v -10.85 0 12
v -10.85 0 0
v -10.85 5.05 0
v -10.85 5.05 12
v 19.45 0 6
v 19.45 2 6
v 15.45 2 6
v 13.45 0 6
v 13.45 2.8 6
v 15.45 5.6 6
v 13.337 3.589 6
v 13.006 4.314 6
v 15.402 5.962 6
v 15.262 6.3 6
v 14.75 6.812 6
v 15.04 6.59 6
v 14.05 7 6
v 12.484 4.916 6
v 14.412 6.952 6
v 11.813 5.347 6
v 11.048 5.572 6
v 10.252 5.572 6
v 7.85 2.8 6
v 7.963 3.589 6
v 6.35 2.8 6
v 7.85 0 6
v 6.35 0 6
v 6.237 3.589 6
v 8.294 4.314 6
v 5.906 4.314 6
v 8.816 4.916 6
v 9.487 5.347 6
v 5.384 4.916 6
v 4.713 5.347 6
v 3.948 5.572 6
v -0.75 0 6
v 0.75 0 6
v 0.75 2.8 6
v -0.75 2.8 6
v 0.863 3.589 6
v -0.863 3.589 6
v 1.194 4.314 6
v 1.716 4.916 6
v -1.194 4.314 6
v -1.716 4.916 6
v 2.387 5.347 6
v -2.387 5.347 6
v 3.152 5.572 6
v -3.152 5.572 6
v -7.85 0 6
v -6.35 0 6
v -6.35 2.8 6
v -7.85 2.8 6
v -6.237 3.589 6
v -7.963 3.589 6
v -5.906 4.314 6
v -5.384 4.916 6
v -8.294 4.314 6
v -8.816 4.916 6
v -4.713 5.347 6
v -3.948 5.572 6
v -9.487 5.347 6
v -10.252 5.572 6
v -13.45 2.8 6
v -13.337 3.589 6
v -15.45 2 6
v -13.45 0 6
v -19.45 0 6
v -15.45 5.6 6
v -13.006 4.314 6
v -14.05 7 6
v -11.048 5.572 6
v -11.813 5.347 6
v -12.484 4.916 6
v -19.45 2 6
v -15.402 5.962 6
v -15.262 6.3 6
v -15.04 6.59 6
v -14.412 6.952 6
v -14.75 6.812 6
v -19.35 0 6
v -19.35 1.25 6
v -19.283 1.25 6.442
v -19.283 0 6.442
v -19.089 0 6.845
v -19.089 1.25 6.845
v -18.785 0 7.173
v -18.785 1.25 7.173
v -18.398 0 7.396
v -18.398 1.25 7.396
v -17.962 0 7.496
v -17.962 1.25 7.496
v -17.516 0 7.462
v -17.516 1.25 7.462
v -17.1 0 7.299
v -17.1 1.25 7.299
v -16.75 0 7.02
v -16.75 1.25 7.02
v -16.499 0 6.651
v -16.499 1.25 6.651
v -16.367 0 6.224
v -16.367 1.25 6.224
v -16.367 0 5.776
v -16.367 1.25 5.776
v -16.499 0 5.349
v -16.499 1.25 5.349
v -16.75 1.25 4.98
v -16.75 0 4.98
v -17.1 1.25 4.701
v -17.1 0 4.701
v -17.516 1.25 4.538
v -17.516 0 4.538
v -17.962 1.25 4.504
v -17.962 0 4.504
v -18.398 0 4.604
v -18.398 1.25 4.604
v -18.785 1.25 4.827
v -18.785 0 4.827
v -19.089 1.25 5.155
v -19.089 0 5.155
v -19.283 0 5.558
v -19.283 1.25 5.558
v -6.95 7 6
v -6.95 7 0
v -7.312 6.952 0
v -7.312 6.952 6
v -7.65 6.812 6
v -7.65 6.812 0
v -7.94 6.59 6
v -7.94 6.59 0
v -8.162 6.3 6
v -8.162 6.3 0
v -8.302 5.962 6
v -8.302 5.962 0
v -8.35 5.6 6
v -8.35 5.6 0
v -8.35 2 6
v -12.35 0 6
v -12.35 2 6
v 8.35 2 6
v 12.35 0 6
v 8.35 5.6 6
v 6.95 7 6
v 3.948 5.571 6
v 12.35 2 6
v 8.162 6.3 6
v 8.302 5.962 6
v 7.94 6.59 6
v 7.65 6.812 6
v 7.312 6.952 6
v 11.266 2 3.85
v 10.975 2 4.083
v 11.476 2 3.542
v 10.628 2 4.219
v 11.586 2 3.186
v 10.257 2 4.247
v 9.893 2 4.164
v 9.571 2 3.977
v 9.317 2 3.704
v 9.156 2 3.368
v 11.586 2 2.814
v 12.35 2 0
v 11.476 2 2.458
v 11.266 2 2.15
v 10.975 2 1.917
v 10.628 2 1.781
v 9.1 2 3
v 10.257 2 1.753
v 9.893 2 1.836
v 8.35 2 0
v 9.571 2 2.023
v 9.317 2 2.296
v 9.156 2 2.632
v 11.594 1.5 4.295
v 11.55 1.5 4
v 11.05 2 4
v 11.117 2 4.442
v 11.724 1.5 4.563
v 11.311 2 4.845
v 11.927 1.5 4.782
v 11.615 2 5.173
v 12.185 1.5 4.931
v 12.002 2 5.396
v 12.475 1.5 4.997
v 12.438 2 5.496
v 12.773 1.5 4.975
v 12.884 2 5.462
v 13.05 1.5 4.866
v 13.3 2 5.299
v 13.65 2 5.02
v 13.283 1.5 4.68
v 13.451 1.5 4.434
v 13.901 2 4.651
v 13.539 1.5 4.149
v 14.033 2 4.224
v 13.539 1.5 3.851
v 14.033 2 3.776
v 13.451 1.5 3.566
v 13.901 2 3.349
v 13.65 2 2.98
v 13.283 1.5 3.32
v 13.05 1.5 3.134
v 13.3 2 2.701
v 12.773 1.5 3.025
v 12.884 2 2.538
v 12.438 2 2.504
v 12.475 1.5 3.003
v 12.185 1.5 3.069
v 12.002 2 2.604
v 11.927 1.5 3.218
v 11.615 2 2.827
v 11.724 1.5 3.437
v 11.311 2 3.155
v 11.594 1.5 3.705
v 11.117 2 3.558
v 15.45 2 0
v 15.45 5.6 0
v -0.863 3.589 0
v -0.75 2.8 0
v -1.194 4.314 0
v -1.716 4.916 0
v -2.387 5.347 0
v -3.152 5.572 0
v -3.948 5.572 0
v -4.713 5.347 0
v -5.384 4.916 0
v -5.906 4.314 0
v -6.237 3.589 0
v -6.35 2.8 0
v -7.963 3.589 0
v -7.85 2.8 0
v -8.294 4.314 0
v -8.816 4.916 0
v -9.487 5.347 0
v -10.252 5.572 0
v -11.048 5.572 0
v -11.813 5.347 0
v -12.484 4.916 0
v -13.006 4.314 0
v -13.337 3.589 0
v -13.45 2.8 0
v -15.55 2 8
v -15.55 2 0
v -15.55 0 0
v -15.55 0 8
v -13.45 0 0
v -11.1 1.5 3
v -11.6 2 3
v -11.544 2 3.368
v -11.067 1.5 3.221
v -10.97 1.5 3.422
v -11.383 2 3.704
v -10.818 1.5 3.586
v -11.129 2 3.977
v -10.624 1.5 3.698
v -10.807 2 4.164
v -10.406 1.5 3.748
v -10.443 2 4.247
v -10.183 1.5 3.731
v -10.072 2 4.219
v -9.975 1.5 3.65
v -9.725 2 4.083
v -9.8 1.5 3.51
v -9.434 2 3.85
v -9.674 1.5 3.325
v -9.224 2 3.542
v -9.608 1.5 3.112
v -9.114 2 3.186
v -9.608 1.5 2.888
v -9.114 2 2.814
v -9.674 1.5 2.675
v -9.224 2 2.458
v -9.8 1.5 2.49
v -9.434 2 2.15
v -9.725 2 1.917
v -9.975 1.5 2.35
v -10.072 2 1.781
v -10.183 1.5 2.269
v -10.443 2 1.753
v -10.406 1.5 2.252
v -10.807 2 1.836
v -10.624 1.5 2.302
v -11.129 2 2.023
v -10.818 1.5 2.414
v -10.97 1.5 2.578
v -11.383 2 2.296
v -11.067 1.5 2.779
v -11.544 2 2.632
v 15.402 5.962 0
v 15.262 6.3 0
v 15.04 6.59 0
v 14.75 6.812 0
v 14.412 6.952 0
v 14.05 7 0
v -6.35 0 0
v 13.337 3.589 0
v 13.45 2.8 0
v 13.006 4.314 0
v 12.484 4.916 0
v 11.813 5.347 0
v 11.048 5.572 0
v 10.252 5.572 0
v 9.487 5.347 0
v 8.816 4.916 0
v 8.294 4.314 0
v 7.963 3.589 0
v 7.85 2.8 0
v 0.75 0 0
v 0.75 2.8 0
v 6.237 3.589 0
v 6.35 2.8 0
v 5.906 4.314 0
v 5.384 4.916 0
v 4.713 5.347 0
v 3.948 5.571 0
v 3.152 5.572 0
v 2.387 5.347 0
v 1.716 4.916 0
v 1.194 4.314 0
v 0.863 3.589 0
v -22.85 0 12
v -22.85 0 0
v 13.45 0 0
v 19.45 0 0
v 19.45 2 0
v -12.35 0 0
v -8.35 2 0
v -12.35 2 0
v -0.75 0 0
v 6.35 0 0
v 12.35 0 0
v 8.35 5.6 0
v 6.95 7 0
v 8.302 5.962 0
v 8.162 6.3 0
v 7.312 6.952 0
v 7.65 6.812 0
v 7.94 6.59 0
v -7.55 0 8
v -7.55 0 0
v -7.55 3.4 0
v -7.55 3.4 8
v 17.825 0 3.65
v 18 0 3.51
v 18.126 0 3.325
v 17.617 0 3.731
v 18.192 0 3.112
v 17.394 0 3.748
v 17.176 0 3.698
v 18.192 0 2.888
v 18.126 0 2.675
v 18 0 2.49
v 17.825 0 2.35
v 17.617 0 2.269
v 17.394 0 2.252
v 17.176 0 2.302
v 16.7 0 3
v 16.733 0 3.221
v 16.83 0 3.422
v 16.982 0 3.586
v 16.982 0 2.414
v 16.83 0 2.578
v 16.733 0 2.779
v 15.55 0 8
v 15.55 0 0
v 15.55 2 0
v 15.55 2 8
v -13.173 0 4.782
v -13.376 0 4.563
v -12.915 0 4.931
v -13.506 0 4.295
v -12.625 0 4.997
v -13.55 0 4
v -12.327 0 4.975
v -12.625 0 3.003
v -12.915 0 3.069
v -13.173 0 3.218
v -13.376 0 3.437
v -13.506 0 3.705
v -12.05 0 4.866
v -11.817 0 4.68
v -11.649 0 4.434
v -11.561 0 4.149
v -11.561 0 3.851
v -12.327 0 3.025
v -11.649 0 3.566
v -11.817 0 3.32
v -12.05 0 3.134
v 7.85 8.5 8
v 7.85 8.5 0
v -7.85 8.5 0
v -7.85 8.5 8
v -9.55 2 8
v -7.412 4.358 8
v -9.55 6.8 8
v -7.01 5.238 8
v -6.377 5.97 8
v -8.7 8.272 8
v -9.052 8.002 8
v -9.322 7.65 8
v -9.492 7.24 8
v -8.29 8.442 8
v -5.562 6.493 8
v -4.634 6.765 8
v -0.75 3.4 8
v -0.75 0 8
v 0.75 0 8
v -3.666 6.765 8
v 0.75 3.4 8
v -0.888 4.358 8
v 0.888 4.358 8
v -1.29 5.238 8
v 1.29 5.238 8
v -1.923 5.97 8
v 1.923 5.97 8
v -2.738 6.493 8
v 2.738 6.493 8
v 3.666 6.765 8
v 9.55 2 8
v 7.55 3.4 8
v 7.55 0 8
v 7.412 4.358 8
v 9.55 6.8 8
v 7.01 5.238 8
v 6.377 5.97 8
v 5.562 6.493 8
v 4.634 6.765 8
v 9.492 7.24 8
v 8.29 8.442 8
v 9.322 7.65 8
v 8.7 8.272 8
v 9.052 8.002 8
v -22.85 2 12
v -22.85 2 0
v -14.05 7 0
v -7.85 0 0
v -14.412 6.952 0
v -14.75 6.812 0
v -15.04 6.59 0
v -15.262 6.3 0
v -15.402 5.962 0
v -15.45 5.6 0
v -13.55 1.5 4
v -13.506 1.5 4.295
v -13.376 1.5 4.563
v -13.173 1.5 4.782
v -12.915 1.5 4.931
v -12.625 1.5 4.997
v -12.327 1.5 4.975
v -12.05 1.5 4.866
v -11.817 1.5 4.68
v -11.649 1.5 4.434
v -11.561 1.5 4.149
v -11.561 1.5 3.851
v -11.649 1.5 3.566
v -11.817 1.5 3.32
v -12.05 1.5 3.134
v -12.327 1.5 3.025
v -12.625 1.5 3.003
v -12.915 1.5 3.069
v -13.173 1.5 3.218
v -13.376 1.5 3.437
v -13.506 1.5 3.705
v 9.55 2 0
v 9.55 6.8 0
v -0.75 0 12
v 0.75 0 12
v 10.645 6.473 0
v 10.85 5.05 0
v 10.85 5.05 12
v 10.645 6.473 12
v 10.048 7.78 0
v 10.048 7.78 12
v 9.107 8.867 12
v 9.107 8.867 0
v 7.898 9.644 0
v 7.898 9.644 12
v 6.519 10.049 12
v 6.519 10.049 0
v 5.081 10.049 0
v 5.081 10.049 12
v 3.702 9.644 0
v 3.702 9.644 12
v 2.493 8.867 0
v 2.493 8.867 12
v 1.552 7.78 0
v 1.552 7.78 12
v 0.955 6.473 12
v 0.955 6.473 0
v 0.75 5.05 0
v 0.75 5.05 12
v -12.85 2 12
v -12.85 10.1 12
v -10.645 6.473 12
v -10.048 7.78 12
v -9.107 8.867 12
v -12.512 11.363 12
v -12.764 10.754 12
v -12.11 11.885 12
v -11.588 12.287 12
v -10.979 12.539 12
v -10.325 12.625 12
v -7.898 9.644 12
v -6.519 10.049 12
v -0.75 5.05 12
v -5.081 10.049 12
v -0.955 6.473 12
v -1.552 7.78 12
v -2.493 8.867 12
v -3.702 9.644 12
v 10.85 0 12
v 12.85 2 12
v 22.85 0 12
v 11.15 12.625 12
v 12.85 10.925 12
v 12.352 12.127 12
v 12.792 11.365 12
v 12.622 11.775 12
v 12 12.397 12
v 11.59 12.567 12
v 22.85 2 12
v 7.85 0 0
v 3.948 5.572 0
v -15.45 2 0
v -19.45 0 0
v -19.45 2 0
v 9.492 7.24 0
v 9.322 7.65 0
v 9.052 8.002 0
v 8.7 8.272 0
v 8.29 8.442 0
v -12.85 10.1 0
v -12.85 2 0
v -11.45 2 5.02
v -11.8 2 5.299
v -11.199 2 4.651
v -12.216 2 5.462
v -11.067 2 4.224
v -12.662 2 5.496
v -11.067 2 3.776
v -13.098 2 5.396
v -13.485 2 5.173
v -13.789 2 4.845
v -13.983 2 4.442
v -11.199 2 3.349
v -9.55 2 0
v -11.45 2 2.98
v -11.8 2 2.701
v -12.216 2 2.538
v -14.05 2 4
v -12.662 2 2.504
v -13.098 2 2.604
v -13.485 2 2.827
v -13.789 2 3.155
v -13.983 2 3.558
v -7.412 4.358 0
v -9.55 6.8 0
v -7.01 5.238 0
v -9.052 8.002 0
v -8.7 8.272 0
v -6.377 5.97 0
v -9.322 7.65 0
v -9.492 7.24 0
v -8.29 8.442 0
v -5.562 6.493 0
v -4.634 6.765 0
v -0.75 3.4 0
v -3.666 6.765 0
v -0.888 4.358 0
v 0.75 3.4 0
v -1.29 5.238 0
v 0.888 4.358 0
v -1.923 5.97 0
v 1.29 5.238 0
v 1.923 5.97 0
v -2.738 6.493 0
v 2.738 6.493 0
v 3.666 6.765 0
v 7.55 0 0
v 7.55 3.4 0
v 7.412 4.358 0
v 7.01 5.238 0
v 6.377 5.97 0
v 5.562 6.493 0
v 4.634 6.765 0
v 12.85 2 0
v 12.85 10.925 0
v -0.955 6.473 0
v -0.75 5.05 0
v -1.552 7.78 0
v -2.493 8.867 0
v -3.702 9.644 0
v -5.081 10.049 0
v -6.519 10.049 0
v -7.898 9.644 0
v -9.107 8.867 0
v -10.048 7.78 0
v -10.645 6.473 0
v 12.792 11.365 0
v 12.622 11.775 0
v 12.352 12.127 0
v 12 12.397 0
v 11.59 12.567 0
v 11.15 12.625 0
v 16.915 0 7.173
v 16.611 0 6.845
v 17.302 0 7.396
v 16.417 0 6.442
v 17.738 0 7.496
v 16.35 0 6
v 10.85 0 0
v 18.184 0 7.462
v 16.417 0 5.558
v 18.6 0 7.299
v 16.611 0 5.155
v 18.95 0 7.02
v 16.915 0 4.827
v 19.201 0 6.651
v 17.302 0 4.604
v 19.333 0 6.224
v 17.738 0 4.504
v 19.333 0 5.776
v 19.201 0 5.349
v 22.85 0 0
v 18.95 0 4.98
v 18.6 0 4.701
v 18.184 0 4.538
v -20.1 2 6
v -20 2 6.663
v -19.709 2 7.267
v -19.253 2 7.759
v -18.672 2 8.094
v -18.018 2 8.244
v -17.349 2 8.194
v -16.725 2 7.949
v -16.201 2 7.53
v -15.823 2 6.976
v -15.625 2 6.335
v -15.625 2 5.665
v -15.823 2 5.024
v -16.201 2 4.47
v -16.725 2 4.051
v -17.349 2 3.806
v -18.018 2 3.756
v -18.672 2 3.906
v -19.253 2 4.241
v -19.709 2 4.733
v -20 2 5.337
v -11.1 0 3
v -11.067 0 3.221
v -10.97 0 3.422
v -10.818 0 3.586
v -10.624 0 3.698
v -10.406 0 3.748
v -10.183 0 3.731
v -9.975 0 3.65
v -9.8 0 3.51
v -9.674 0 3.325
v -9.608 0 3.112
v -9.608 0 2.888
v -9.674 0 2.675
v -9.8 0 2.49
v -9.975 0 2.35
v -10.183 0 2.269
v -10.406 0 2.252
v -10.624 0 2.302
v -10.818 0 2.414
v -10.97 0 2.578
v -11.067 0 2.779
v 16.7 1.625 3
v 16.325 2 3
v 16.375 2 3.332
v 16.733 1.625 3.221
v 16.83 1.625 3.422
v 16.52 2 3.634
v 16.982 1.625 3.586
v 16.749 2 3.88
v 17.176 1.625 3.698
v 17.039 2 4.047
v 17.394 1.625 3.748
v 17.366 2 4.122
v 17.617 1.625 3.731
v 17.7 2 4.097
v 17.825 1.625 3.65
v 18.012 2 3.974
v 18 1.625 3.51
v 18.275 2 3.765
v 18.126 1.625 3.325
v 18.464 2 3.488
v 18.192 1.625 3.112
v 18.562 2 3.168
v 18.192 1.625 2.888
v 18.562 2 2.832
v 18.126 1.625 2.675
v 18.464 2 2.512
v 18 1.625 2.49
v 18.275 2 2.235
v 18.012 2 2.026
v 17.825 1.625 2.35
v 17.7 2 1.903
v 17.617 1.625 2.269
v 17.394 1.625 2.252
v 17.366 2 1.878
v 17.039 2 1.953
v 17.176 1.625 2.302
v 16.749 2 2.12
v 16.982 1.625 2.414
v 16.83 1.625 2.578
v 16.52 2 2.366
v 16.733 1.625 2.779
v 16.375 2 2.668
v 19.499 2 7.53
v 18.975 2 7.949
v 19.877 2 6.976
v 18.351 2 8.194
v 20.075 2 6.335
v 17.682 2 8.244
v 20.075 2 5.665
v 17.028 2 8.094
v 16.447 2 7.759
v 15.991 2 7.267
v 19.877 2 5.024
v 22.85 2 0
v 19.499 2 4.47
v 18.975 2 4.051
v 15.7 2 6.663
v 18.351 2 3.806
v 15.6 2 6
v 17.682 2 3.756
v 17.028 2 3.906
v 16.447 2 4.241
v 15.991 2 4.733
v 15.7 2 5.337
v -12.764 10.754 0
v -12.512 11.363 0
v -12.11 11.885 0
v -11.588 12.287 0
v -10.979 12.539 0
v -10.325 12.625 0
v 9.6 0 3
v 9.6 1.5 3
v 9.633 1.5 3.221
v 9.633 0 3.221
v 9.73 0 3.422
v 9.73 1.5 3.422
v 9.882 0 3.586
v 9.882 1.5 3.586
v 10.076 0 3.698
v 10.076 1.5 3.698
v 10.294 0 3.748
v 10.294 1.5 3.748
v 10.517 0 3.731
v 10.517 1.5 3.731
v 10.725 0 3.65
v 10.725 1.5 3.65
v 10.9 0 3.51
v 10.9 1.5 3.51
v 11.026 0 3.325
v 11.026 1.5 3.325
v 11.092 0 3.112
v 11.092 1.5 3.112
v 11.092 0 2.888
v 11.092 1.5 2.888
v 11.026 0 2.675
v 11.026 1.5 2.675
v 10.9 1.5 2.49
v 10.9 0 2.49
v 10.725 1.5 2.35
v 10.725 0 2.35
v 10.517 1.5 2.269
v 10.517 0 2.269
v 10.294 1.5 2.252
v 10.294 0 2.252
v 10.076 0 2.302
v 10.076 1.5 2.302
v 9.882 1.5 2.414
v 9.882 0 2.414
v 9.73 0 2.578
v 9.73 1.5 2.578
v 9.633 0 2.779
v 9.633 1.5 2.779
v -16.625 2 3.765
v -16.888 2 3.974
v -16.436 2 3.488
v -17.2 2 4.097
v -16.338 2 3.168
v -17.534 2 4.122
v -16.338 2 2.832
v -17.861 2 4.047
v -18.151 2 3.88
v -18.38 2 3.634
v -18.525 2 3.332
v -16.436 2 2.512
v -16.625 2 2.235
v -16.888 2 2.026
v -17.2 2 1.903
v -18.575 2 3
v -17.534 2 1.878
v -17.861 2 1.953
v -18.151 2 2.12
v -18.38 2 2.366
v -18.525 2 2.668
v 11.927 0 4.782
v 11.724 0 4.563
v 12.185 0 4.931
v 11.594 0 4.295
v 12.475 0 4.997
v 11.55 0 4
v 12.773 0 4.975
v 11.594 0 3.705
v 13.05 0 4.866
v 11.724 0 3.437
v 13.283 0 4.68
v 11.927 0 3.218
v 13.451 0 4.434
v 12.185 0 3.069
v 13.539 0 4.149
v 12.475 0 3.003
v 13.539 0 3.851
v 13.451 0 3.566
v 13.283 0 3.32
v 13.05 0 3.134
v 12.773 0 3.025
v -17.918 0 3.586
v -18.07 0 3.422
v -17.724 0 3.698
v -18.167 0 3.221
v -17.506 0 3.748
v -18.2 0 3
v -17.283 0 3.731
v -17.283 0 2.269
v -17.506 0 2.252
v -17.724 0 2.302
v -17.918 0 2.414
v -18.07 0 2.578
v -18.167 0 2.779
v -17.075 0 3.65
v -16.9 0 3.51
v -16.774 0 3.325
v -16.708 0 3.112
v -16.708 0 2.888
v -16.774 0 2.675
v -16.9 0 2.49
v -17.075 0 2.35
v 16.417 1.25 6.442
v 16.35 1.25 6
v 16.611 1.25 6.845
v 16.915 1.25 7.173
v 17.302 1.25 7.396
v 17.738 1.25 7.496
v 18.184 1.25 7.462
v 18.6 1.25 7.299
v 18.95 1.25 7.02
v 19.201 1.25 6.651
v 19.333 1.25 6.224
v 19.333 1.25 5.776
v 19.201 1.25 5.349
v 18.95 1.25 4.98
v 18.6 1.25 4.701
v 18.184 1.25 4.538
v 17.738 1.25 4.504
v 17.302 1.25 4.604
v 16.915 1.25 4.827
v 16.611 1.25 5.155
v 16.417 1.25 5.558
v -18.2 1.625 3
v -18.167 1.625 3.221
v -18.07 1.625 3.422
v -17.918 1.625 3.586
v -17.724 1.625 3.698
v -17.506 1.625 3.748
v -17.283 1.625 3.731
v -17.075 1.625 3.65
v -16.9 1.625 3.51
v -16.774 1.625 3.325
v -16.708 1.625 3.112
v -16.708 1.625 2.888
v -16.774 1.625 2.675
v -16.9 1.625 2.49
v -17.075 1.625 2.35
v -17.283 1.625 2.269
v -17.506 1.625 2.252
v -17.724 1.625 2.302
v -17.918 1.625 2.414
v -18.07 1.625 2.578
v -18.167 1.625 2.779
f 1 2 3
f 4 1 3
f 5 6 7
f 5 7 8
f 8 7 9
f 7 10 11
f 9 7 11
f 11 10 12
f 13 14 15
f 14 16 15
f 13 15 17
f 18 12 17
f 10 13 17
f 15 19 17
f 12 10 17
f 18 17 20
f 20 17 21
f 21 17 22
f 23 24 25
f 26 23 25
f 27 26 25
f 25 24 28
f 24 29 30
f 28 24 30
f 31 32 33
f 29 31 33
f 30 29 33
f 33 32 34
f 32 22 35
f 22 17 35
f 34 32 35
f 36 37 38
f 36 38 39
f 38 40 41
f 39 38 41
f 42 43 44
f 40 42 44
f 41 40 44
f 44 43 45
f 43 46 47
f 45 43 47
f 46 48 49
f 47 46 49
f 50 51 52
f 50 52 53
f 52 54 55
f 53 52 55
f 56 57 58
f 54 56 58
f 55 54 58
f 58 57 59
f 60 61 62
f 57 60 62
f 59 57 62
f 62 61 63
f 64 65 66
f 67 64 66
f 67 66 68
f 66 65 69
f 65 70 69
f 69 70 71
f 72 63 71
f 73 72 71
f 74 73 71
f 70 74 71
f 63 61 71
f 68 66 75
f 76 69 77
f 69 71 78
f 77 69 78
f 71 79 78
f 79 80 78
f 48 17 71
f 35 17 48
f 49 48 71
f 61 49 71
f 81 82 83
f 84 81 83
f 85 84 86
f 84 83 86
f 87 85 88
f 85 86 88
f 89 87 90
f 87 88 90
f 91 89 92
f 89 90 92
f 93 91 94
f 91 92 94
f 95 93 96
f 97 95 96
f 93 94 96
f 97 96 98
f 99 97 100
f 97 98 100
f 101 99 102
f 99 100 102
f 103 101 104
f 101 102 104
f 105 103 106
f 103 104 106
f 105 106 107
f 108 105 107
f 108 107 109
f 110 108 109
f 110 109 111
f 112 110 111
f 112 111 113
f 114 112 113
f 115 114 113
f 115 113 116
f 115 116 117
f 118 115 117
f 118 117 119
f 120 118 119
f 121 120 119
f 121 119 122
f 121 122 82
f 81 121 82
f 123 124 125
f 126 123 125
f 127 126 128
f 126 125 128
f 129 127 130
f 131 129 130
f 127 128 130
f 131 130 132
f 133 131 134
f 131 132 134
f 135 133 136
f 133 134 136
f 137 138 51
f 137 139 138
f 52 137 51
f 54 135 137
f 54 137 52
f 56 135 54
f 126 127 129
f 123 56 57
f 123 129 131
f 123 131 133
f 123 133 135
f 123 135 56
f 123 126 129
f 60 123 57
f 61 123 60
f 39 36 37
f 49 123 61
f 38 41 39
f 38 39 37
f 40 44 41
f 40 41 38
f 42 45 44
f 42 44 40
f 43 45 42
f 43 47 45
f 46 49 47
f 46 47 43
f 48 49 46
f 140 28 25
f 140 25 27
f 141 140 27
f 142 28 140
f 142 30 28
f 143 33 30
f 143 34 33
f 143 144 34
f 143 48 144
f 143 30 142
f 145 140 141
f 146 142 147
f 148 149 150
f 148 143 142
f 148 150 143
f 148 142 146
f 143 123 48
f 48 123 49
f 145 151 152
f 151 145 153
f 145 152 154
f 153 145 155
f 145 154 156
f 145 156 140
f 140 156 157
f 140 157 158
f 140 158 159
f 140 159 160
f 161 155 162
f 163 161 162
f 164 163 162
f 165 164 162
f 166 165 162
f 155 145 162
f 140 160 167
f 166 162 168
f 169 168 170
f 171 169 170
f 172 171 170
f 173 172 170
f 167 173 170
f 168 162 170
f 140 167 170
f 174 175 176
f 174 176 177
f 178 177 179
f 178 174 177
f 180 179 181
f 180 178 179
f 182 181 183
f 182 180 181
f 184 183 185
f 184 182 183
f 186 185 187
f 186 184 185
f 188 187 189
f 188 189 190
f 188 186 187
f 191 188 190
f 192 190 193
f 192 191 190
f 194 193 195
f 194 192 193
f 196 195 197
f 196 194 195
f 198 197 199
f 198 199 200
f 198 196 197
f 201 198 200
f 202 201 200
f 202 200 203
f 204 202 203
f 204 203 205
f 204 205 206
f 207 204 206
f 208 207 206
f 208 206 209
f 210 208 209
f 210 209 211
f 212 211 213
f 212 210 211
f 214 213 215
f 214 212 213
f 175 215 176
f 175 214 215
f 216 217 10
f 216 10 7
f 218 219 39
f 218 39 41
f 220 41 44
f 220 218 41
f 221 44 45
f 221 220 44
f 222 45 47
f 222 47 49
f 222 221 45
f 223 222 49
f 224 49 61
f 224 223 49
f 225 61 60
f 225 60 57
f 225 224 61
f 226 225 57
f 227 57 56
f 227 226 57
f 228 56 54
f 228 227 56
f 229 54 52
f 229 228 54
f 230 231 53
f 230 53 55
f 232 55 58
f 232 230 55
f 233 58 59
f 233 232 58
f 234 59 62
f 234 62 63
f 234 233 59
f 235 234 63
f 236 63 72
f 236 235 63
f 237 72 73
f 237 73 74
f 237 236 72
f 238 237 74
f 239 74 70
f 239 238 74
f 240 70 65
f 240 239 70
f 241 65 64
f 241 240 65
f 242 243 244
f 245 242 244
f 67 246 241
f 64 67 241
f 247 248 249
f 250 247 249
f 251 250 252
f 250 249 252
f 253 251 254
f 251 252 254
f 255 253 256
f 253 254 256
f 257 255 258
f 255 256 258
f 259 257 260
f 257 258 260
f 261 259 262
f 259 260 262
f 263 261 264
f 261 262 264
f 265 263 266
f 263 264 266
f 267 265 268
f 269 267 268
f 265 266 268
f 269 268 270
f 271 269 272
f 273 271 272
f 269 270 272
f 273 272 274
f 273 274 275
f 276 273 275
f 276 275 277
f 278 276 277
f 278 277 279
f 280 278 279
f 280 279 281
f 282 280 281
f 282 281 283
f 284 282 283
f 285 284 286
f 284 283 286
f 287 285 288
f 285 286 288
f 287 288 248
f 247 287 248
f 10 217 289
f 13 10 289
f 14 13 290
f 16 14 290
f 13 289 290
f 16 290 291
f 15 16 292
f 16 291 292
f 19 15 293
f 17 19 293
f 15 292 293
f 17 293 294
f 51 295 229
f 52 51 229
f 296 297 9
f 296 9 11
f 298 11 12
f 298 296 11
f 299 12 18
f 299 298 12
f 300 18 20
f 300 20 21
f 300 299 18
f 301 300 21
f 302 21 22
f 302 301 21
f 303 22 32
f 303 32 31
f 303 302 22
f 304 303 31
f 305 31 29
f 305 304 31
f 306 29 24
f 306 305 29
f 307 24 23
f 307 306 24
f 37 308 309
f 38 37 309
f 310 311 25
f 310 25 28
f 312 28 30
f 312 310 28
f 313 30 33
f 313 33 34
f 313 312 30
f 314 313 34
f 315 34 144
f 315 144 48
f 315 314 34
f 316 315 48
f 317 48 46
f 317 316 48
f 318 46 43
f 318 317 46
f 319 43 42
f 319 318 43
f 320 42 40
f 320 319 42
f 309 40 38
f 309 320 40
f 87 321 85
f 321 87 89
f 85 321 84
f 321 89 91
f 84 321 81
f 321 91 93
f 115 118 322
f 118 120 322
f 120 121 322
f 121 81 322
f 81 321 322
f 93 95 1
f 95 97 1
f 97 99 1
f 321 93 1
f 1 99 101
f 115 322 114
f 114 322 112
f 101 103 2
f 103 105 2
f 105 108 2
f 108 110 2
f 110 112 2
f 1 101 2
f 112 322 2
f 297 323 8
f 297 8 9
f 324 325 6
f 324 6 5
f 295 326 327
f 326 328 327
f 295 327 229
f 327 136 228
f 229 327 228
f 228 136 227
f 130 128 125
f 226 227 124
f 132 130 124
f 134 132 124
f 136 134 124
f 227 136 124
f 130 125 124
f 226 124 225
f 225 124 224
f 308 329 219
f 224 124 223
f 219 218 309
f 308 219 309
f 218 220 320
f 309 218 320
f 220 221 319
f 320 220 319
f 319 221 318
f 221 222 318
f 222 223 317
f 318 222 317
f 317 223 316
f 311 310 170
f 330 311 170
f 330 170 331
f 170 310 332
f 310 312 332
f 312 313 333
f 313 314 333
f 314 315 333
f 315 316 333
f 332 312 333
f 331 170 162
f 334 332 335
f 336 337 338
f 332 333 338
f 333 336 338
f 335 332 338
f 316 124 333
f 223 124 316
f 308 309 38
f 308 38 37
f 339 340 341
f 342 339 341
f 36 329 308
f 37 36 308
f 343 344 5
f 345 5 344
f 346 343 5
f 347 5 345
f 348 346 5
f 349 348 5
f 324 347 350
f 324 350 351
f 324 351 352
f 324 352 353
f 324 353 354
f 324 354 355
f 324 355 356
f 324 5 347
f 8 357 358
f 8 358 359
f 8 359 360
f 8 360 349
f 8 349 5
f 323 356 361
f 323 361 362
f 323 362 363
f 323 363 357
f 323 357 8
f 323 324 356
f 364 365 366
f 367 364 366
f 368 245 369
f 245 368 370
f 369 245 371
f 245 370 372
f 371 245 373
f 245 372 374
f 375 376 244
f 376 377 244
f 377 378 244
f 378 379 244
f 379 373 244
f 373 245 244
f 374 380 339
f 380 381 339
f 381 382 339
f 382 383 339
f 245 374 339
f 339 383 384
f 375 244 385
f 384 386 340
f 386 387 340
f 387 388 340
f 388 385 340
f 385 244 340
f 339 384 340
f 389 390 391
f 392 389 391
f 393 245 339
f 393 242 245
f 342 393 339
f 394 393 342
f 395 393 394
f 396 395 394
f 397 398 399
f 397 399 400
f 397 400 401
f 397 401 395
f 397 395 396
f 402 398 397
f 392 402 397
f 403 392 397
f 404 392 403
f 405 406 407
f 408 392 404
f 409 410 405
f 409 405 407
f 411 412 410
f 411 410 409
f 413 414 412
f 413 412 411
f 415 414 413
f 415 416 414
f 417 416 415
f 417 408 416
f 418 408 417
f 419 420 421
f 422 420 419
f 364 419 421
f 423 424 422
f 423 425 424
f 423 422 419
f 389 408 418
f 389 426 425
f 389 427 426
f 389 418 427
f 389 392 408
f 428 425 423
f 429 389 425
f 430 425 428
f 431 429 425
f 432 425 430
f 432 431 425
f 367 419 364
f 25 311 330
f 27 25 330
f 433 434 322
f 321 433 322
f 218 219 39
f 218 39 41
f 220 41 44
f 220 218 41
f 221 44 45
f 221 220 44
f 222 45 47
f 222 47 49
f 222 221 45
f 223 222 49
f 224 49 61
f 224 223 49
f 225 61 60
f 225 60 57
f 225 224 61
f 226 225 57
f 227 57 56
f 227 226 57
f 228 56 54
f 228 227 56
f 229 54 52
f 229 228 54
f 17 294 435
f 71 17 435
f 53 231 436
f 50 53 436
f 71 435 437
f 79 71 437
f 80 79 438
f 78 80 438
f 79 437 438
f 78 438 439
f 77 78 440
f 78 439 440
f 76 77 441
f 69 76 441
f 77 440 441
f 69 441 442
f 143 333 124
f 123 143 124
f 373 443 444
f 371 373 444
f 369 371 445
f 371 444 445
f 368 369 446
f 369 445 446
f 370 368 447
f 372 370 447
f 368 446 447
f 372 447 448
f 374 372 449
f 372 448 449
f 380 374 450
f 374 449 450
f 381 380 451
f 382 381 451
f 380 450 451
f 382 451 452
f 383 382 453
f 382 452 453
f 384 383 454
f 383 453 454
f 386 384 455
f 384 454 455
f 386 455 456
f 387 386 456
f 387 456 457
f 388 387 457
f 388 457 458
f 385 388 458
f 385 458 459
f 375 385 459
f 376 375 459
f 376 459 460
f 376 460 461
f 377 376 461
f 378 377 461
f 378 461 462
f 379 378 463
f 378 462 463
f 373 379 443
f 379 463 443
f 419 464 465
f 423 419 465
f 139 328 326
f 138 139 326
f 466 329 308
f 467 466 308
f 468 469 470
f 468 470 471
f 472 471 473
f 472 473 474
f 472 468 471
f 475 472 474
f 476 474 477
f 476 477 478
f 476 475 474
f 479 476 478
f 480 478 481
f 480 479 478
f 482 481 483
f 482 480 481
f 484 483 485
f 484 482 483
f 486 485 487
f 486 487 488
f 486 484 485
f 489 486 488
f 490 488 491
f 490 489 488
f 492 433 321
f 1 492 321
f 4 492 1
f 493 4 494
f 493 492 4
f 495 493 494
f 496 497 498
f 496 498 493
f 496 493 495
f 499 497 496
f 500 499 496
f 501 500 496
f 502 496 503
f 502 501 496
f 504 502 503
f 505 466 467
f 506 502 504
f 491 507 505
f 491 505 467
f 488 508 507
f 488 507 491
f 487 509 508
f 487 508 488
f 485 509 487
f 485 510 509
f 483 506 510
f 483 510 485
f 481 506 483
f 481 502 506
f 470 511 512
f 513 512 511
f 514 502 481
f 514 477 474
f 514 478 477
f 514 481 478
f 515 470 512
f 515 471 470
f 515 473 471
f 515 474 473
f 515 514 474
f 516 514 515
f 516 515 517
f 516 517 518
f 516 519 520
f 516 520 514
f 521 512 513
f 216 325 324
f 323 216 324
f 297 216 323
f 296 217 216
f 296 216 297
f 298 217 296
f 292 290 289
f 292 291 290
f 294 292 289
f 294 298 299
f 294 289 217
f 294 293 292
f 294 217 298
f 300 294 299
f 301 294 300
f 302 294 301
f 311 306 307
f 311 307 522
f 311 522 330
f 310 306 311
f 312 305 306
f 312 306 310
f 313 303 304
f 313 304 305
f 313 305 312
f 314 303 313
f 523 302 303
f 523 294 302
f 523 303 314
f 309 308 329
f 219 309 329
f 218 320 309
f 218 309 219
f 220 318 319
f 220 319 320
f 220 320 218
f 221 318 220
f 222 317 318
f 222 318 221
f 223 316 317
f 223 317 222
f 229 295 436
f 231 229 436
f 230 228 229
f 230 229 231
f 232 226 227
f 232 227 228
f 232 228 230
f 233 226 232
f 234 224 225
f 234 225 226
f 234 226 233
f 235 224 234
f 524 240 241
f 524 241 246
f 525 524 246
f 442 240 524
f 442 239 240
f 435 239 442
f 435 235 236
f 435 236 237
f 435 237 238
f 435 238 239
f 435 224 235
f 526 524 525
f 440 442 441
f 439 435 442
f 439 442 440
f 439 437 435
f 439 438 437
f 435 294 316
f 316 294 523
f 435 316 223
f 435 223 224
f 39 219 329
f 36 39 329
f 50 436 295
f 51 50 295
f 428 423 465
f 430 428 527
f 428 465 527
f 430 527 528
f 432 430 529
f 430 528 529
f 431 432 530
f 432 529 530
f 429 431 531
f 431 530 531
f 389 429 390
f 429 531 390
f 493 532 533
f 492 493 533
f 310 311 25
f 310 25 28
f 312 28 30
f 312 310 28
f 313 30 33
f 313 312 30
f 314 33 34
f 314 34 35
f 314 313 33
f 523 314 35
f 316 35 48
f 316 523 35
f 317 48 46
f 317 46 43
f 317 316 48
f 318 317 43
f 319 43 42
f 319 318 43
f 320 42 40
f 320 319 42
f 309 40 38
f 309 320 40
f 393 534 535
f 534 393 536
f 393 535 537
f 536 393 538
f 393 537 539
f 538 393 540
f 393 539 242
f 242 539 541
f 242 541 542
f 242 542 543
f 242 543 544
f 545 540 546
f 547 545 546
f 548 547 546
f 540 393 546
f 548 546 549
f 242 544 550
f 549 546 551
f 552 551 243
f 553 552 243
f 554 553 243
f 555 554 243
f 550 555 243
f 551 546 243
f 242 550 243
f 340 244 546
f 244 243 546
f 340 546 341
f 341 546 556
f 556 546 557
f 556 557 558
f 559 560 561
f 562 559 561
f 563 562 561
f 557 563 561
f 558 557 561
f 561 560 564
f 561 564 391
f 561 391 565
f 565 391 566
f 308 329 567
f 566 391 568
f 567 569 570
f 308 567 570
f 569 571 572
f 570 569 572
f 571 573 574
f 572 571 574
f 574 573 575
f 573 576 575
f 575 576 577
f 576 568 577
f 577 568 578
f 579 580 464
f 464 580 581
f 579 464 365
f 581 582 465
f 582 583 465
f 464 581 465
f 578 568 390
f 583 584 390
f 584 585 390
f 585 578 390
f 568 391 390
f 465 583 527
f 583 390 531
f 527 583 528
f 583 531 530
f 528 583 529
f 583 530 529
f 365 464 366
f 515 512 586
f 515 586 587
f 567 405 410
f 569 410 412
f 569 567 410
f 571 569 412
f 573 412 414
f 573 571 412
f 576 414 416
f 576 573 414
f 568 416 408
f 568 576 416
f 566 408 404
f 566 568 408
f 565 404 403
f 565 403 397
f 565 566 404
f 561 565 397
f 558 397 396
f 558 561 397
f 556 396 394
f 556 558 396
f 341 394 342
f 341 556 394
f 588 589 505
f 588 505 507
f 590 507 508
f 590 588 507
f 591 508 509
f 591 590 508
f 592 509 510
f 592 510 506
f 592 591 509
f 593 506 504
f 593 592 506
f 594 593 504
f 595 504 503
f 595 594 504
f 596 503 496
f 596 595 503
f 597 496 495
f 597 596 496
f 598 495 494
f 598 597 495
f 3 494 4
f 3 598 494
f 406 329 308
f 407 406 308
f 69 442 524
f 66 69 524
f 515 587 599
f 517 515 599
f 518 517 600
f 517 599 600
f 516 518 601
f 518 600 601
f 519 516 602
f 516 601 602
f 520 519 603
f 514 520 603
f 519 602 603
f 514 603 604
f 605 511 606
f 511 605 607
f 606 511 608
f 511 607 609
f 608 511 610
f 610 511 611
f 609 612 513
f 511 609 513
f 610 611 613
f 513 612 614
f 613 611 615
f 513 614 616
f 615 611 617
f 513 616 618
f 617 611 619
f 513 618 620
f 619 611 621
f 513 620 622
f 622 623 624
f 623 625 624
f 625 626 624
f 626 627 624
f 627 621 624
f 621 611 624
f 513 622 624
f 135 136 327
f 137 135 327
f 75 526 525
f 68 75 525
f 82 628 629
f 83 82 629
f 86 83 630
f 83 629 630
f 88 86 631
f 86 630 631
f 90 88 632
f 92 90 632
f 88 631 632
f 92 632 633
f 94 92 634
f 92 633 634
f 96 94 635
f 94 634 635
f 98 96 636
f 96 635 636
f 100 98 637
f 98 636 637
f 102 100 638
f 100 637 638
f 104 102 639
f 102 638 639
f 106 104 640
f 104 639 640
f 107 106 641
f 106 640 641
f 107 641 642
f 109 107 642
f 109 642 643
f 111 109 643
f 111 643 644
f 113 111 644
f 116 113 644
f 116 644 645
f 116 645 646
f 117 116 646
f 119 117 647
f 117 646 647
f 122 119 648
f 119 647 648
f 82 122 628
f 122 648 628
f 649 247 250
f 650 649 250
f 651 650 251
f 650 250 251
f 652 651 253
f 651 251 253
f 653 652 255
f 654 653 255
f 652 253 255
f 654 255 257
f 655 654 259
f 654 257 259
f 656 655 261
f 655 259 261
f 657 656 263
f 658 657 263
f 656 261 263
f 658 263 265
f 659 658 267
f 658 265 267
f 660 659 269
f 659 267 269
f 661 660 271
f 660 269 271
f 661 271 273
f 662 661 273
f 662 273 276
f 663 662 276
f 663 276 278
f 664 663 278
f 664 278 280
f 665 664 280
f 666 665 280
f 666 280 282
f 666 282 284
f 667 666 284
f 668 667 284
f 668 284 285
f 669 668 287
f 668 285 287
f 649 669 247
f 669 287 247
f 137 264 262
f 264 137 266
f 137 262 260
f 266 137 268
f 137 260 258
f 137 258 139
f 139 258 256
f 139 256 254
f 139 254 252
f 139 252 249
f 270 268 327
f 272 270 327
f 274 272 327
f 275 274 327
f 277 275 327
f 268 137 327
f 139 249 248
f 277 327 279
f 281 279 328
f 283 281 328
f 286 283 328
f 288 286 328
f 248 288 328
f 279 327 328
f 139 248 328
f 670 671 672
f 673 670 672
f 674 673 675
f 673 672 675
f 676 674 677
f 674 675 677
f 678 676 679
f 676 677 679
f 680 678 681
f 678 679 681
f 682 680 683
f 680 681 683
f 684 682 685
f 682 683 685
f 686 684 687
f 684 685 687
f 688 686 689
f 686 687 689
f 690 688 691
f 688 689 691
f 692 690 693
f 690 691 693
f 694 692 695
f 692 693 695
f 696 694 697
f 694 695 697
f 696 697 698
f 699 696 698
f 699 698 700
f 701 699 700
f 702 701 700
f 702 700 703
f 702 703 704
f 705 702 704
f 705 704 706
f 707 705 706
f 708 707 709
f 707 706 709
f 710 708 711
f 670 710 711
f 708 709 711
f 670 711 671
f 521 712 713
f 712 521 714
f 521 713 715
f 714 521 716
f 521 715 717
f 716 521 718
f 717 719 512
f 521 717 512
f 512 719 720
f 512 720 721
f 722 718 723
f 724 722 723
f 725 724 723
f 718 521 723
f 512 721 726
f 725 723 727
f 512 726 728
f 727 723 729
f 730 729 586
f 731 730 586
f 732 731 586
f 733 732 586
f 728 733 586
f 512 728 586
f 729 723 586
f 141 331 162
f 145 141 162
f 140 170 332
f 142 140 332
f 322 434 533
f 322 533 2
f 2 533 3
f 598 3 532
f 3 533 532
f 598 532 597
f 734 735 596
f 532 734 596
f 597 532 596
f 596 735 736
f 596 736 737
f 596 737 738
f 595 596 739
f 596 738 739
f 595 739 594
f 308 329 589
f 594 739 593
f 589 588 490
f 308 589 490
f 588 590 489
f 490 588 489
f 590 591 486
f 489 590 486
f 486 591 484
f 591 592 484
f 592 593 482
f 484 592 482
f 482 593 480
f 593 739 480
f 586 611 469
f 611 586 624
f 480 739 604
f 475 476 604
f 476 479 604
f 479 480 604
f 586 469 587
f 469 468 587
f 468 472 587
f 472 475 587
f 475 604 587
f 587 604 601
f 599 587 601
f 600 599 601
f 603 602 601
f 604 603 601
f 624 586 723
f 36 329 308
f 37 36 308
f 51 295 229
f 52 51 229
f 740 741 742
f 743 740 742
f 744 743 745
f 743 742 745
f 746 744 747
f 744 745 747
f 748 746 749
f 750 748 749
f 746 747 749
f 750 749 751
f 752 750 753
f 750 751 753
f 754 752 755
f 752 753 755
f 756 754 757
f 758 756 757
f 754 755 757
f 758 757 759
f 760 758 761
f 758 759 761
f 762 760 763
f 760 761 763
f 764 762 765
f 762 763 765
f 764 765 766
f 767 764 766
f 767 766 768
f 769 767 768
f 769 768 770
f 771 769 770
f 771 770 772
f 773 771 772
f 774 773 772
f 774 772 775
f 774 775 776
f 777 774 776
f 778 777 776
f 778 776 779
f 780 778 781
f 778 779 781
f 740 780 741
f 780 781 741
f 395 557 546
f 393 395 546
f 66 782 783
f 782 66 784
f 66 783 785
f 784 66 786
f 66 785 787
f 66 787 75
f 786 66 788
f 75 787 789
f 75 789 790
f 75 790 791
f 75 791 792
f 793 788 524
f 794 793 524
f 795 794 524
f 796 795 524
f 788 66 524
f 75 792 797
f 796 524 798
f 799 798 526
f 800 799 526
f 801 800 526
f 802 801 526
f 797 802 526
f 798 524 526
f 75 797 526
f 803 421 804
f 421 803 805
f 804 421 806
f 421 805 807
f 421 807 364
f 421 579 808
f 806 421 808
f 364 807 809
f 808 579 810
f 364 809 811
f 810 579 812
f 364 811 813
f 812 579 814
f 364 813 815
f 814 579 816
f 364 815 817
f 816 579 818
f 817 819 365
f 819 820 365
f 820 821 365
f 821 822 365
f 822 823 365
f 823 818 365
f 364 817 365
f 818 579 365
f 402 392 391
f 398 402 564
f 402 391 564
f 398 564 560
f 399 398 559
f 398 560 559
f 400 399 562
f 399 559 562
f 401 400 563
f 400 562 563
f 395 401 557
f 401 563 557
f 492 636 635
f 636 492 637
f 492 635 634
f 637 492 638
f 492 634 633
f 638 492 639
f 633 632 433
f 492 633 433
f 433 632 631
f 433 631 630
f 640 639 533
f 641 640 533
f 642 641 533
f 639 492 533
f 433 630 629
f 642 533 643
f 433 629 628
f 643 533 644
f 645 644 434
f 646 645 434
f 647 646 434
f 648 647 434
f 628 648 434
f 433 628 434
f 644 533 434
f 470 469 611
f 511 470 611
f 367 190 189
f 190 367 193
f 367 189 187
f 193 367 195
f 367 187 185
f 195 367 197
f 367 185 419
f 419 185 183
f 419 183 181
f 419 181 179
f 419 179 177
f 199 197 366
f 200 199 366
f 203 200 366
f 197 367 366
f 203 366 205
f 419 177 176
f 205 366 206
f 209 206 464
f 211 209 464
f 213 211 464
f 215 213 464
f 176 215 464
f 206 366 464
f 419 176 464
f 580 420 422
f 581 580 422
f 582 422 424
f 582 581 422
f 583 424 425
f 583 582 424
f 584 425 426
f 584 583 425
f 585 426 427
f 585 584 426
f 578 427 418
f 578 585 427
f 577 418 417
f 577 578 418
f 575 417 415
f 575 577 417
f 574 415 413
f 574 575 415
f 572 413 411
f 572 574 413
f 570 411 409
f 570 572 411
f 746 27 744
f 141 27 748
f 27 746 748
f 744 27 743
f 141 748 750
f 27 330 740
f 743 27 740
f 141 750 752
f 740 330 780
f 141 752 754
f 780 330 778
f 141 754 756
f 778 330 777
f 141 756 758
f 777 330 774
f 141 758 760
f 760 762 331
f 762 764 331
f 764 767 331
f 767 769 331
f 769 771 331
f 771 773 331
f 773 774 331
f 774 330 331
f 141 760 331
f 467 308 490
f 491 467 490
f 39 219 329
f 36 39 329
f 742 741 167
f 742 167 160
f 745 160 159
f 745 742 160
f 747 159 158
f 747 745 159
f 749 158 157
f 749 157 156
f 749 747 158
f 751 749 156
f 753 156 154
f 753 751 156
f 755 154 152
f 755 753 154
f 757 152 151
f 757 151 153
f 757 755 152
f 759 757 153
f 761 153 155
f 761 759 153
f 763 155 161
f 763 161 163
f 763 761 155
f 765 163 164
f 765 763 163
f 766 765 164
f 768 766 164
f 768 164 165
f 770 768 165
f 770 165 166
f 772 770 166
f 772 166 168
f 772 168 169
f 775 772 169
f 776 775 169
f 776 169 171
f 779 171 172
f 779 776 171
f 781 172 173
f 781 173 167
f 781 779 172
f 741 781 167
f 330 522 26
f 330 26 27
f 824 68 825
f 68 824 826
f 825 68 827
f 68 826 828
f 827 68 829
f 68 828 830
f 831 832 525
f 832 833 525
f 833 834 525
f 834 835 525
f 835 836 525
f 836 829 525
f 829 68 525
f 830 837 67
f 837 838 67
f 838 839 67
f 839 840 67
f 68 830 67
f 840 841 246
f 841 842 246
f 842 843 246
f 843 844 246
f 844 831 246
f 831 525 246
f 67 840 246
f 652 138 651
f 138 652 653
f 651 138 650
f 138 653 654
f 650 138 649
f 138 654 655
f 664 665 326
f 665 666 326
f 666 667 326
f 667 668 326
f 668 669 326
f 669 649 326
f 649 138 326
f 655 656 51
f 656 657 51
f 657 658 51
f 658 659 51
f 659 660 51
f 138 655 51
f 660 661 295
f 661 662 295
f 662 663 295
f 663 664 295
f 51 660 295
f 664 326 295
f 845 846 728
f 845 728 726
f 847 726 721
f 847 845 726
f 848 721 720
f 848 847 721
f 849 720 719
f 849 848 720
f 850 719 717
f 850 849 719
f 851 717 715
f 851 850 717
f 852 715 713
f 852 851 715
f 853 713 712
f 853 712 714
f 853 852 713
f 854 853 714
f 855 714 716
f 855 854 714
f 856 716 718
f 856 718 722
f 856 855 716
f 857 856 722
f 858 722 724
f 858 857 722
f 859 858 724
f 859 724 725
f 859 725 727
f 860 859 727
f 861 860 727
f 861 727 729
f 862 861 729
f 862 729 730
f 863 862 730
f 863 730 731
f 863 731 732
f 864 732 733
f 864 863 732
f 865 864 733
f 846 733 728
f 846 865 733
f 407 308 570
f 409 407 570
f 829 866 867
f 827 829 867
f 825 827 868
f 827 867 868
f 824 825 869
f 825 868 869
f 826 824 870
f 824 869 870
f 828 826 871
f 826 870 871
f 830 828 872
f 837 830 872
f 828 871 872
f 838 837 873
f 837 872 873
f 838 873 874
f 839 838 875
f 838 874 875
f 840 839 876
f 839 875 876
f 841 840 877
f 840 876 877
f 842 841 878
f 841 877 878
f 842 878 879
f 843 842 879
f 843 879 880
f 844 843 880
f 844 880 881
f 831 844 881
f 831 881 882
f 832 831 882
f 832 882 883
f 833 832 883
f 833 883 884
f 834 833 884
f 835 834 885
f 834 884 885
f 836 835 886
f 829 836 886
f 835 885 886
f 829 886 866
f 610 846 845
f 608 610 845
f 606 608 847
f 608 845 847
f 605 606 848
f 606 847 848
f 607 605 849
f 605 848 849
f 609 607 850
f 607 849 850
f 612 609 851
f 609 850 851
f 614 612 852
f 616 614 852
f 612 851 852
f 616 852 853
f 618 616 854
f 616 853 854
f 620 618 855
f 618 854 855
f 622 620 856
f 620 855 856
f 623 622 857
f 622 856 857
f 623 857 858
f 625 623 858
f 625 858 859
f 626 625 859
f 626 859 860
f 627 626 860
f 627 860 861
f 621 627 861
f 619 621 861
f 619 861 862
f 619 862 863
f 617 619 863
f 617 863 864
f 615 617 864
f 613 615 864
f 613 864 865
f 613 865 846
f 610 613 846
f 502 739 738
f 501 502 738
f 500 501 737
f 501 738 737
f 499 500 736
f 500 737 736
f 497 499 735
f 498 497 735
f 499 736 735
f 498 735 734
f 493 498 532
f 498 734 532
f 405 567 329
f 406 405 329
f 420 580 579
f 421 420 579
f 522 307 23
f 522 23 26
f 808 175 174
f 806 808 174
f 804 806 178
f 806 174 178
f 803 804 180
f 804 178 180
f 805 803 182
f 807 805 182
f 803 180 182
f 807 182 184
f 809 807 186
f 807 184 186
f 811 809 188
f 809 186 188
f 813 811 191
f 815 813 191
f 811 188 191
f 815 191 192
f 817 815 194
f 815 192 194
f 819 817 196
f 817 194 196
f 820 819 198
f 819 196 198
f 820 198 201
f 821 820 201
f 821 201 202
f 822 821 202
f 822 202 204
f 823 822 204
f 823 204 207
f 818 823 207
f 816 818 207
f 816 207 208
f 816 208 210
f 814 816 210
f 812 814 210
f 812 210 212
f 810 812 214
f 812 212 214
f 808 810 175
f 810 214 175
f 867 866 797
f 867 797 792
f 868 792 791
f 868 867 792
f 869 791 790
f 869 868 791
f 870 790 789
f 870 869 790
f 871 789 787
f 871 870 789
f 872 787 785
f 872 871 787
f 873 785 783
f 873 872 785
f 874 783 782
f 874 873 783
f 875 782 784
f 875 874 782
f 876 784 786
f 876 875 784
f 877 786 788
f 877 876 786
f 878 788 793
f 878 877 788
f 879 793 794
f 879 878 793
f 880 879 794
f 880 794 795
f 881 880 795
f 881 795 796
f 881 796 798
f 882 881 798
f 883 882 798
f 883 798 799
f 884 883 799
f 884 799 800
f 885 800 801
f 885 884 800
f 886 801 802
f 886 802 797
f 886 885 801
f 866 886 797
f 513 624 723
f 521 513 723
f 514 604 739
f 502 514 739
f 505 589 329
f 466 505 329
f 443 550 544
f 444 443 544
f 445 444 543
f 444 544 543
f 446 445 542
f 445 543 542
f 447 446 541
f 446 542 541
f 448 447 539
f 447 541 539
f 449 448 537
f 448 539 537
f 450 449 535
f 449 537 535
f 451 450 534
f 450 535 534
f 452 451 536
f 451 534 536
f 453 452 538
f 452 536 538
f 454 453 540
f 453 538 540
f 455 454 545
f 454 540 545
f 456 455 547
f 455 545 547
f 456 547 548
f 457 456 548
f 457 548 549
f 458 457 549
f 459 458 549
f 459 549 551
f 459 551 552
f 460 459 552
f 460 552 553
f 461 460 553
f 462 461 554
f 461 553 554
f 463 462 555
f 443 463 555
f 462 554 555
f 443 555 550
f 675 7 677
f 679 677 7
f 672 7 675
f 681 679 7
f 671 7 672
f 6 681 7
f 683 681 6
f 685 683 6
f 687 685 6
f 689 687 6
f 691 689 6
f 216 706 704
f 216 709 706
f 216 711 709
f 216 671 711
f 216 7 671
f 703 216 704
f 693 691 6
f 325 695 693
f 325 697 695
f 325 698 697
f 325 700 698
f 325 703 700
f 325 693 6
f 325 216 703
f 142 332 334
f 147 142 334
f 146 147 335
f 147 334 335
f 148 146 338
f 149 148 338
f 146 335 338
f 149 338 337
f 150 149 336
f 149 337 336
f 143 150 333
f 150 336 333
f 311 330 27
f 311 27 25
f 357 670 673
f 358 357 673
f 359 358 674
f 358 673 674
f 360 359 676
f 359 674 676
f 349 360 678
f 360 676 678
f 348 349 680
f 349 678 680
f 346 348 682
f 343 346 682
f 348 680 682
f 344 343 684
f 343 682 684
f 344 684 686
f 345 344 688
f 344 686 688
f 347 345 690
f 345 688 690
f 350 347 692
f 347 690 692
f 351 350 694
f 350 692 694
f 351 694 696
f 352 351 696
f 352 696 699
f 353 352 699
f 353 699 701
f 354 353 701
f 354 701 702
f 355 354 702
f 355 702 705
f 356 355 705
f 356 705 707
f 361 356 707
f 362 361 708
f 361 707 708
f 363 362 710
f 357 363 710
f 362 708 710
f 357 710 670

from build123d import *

# Parameters (mm, degrees)
PAD_DEPTH       = 8
SKETCH001_R     = 1
POCKET_DEPTH    = 2
CHAMFER_SIZE    = 0.5
PAD001_DEPTH    = 12
SKETCH003_R     = 1.5
POCKET001_DEPTH = 3
CHAMFER001_SIZE = 0.75
PAD002_DEPTH    = 6
SKETCH005_R     = 0.75
POCKET002_DEPTH = 2
CHAMFER002_SIZE = 0.5
PAD003_DEPTH    = 6
SKETCH009_R     = 0.75
POCKET003_DEPTH = 2
CHAMFER003_SIZE = 0.375


with BuildPart() as f_2x8gbody:
    # Sketch → Pad (new body)
    with BuildSketch(Plane.XY):
        with BuildLine():
            Line((-15.55, 0), (-7.55, 0))
            Line((-7.55, 0), (-7.55, 3.4))
            ThreePointArc((-0.75, 3.399992), (-4.149996, 6.8), (-7.55, 3.4))
            Line((-0.75, 3.399992), (-0.75, 0))
            Line((-0.75, 0), (0.75, 0))
            Line((0.75, 0), (0.75, 3.4))
            ThreePointArc((7.55, 3.4), (4.15, 6.8), (0.75, 3.4))
            Line((7.55, 3.4), (7.55, 0))
            Line((7.55, 0), (15.55, 0))
            Line((15.55, 0), (15.55, 2))
            Line((15.55, 2), (9.55, 2))
            Line((9.55, 2), (9.55, 6.8))
            ThreePointArc((9.55, 6.8), (9.052082, 8.002082), (7.85, 8.5))
            Line((7.85, 8.5), (-7.85, 8.5))
            ThreePointArc((-7.85, 8.5), (-9.052082, 8.002082), (-9.55, 6.8))
            Line((-9.55, 6.8), (-9.55, 2))
            Line((-9.55, 2), (-15.55, 2))
            Line((-15.55, 2), (-15.55, 0))
        make_face()
    extrude(amount=PAD_DEPTH)

    # Sketch001 (on Face4 of Pad) → Pocket (cut)
    with BuildSketch(Plane(origin=(0, 2, 0), x_dir=(-1, 0, 0), z_dir=(0, 1, 0))):
        with Locations((-12.55, 4)):
            Circle(SKETCH001_R)
        with Locations((12.55, 4)):
            Circle(SKETCH001_R)
    extrude(amount=-POCKET_DEPTH, mode=Mode.SUBTRACT)

    # Chamfer
    chamfer_edges = [f_2x8gbody.edges().sort_by_distance(p)[0] for p in [
        (11.55, 1, 4),
        (-11.55, 2, 4),
        (13.55, 2, 4),
    ]]
    chamfer(chamfer_edges, length=CHAMFER_SIZE)


with BuildPart() as f_2x4gbody:
    # Sketch002 → Pad001 (new body)
    with BuildSketch(Plane.XY):
        with BuildLine():
            Line((-22.85, 0), (-10.85, 0))
            Line((-10.85, 0), (-10.85, 5.05))
            ThreePointArc((-0.75, 5.049984), (-5.799992, 10.1), (-10.85, 5.05))
            Line((-0.75, 5.049984), (-0.75, 0))
            Line((-0.75, 0), (0.75, 0))
            Line((0.75, 0), (0.75, 5.05))
            ThreePointArc((10.85, 5.05), (5.8, 10.1), (0.75, 5.05))
            Line((10.85, 5.05), (10.85, 0))
            Line((10.85, 0), (22.85, 0))
            Line((22.85, 0), (22.85, 2))
            Line((22.85, 2), (12.85, 2))
            Line((12.85, 2), (12.85, 10.925))
            ThreePointArc((12.85, 10.925), (12.352082, 12.127082), (11.15, 12.625))
            Line((11.15, 12.625), (-10.325, 12.625))
            ThreePointArc((-10.325, 12.625), (-12.110445, 11.885445), (-12.85, 10.1))
            Line((-12.85, 10.1), (-12.85, 2))
            Line((-12.85, 2), (-22.85, 2))
            Line((-22.85, 2), (-22.85, 0))
        make_face()
    extrude(amount=PAD001_DEPTH)

    # Sketch003 (on Face4 of Pad001) → Pocket001 (cut)
    with BuildSketch(Plane(origin=(0, 2, 0), x_dir=(-1, 0, 0), z_dir=(0, 1, 0))):
        with Locations((-17.85, 6)):
            Circle(SKETCH003_R)
        with Locations((17.85, 6)):
            Circle(SKETCH003_R)
    extrude(amount=-POCKET001_DEPTH, mode=Mode.SUBTRACT)

    # Chamfer001
    chamfer001_edges = [f_2x4gbody.edges().sort_by_distance(p)[0] for p in [
        (16.35, 1, 6),
        (-16.35, 2, 6),
        (19.35, 2, 6),
    ]]
    chamfer(chamfer001_edges, length=CHAMFER001_SIZE)


with BuildPart() as f_2x10gbody:
    # Sketch004 → Pad002 (new body)
    with BuildSketch(Plane.XY):
        with BuildLine():
            Line((-12.35, 0), (-6.35, 0))
            Line((-6.35, 0), (-6.35, 2.8))
            ThreePointArc((-0.75, 2.8), (-3.55, 5.6), (-6.35, 2.8))
            Line((-0.75, 2.8), (-0.75, 0))
            Line((-0.75, 0), (0.75, 0))
            Line((0.75, 0), (0.75, 2.800002))
            ThreePointArc((6.35, 2.8), (3.550001, 5.6), (0.75, 2.800002))
            Line((6.35, 2.8), (6.35, 0))
            Line((6.35, 0), (12.35, 0))
            Line((12.35, 0), (12.35, 2))
            Line((12.35, 2), (8.35, 2))
            Line((8.35, 2), (8.35, 5.6))
            ThreePointArc((8.35, 5.6), (7.939949, 6.589949), (6.95, 7))
            Line((6.95, 7), (-6.95, 7))
            ThreePointArc((-6.95, 7), (-7.939949, 6.589949), (-8.35, 5.6))
            Line((-8.35, 5.6), (-8.35, 2))
            Line((-8.35, 2), (-12.35, 2))
            Line((-12.35, 2), (-12.35, 0))
        make_face()
    extrude(amount=PAD002_DEPTH)

    # Sketch005 (on Face4 of Pad002) → Pocket002 (cut)
    with BuildSketch(Plane(origin=(0, 2, 0), x_dir=(-1, 0, 0), z_dir=(0, 1, 0))):
        with Locations((-10.35, 3)):
            Circle(SKETCH005_R)
        with Locations((10.35, 3)):
            Circle(SKETCH005_R)
    extrude(amount=-POCKET002_DEPTH, mode=Mode.SUBTRACT)

    # Chamfer002
    chamfer002_edges = [f_2x10gbody.edges().sort_by_distance(p)[0] for p in [
        (9.6, 1, 3),
        (-9.6, 2, 3),
        (11.1, 2, 3),
    ]]
    chamfer(chamfer002_edges, length=CHAMFER002_SIZE)


with BuildPart() as f_4x10gbody:
    # Sketch008 → Pad003 (new body)
    with BuildSketch(Plane.XY):
        with BuildLine():
            Line((19.45, 0), (13.45, 0))
            Line((13.45, 0), (13.45, 2.8))
            ThreePointArc((13.45, 2.8), (10.65, 5.6), (7.85, 2.8))
            Line((7.85, 2.8), (7.85, 0))
            Line((7.85, 0), (6.35, 0))
            Line((6.35, 0), (6.35, 2.8))
            ThreePointArc((6.35, 2.8), (3.55, 5.6), (0.75, 2.8))
            Line((0.75, 2.8), (0.75, 0))
            Line((0.75, 0), (0, 0))
            Line((-0.75, 0), (0, 0))
            Line((-0.75, 2.8), (-0.75, 0))
            ThreePointArc((-0.75, 2.8), (-3.55, 5.6), (-6.35, 2.8))
            Line((-6.35, 0), (-6.35, 2.8))
            Line((-7.85, 0), (-6.35, 0))
            Line((-7.85, 2.8), (-7.85, 0))
            ThreePointArc((-7.85, 2.8), (-10.65, 5.6), (-13.45, 2.8))
            Line((-13.45, 0), (-13.45, 2.8))
            Line((-19.45, 0), (-13.45, 0))
            Line((-19.45, 2), (-19.45, 0))
            Line((-15.45, 2), (-19.45, 2))
            Line((-15.45, 5.6), (-15.45, 2))
            ThreePointArc((-14.05, 7), (-15.039949, 6.589949), (-15.45, 5.6))
            Line((-14.05, 7), (0, 7))
            Line((14.05, 7), (0, 7))
            ThreePointArc((15.45, 5.6), (15.039949, 6.589949), (14.05, 7))
            Line((15.45, 5.6), (15.45, 2))
            Line((15.45, 2), (19.45, 2))
            Line((19.45, 2), (19.45, 0))
        make_face()
    extrude(amount=PAD003_DEPTH)

    # Sketch009 (on Face2 of Pad003) → Pocket003 (cut)
    with BuildSketch(Plane(origin=(0, 2, 0), x_dir=(-1, 0, 0), z_dir=(0, 1, 0))):
        with Locations((-17.45, 3)):
            Circle(SKETCH009_R)
        with Locations((17.45, 3)):
            Circle(SKETCH009_R)
    extrude(amount=-POCKET003_DEPTH, mode=Mode.SUBTRACT)

    # Chamfer003
    chamfer003_edges = [f_4x10gbody.edges().sort_by_distance(p)[0] for p in [
        (18.2, 2, 3),
        (-16.7, 2, 3),
    ]]
    chamfer(chamfer003_edges, length=CHAMFER003_SIZE)


solid = Compound([f_2x8gbody.part, f_2x4gbody.part, f_2x10gbody.part, f_4x10gbody.part])
